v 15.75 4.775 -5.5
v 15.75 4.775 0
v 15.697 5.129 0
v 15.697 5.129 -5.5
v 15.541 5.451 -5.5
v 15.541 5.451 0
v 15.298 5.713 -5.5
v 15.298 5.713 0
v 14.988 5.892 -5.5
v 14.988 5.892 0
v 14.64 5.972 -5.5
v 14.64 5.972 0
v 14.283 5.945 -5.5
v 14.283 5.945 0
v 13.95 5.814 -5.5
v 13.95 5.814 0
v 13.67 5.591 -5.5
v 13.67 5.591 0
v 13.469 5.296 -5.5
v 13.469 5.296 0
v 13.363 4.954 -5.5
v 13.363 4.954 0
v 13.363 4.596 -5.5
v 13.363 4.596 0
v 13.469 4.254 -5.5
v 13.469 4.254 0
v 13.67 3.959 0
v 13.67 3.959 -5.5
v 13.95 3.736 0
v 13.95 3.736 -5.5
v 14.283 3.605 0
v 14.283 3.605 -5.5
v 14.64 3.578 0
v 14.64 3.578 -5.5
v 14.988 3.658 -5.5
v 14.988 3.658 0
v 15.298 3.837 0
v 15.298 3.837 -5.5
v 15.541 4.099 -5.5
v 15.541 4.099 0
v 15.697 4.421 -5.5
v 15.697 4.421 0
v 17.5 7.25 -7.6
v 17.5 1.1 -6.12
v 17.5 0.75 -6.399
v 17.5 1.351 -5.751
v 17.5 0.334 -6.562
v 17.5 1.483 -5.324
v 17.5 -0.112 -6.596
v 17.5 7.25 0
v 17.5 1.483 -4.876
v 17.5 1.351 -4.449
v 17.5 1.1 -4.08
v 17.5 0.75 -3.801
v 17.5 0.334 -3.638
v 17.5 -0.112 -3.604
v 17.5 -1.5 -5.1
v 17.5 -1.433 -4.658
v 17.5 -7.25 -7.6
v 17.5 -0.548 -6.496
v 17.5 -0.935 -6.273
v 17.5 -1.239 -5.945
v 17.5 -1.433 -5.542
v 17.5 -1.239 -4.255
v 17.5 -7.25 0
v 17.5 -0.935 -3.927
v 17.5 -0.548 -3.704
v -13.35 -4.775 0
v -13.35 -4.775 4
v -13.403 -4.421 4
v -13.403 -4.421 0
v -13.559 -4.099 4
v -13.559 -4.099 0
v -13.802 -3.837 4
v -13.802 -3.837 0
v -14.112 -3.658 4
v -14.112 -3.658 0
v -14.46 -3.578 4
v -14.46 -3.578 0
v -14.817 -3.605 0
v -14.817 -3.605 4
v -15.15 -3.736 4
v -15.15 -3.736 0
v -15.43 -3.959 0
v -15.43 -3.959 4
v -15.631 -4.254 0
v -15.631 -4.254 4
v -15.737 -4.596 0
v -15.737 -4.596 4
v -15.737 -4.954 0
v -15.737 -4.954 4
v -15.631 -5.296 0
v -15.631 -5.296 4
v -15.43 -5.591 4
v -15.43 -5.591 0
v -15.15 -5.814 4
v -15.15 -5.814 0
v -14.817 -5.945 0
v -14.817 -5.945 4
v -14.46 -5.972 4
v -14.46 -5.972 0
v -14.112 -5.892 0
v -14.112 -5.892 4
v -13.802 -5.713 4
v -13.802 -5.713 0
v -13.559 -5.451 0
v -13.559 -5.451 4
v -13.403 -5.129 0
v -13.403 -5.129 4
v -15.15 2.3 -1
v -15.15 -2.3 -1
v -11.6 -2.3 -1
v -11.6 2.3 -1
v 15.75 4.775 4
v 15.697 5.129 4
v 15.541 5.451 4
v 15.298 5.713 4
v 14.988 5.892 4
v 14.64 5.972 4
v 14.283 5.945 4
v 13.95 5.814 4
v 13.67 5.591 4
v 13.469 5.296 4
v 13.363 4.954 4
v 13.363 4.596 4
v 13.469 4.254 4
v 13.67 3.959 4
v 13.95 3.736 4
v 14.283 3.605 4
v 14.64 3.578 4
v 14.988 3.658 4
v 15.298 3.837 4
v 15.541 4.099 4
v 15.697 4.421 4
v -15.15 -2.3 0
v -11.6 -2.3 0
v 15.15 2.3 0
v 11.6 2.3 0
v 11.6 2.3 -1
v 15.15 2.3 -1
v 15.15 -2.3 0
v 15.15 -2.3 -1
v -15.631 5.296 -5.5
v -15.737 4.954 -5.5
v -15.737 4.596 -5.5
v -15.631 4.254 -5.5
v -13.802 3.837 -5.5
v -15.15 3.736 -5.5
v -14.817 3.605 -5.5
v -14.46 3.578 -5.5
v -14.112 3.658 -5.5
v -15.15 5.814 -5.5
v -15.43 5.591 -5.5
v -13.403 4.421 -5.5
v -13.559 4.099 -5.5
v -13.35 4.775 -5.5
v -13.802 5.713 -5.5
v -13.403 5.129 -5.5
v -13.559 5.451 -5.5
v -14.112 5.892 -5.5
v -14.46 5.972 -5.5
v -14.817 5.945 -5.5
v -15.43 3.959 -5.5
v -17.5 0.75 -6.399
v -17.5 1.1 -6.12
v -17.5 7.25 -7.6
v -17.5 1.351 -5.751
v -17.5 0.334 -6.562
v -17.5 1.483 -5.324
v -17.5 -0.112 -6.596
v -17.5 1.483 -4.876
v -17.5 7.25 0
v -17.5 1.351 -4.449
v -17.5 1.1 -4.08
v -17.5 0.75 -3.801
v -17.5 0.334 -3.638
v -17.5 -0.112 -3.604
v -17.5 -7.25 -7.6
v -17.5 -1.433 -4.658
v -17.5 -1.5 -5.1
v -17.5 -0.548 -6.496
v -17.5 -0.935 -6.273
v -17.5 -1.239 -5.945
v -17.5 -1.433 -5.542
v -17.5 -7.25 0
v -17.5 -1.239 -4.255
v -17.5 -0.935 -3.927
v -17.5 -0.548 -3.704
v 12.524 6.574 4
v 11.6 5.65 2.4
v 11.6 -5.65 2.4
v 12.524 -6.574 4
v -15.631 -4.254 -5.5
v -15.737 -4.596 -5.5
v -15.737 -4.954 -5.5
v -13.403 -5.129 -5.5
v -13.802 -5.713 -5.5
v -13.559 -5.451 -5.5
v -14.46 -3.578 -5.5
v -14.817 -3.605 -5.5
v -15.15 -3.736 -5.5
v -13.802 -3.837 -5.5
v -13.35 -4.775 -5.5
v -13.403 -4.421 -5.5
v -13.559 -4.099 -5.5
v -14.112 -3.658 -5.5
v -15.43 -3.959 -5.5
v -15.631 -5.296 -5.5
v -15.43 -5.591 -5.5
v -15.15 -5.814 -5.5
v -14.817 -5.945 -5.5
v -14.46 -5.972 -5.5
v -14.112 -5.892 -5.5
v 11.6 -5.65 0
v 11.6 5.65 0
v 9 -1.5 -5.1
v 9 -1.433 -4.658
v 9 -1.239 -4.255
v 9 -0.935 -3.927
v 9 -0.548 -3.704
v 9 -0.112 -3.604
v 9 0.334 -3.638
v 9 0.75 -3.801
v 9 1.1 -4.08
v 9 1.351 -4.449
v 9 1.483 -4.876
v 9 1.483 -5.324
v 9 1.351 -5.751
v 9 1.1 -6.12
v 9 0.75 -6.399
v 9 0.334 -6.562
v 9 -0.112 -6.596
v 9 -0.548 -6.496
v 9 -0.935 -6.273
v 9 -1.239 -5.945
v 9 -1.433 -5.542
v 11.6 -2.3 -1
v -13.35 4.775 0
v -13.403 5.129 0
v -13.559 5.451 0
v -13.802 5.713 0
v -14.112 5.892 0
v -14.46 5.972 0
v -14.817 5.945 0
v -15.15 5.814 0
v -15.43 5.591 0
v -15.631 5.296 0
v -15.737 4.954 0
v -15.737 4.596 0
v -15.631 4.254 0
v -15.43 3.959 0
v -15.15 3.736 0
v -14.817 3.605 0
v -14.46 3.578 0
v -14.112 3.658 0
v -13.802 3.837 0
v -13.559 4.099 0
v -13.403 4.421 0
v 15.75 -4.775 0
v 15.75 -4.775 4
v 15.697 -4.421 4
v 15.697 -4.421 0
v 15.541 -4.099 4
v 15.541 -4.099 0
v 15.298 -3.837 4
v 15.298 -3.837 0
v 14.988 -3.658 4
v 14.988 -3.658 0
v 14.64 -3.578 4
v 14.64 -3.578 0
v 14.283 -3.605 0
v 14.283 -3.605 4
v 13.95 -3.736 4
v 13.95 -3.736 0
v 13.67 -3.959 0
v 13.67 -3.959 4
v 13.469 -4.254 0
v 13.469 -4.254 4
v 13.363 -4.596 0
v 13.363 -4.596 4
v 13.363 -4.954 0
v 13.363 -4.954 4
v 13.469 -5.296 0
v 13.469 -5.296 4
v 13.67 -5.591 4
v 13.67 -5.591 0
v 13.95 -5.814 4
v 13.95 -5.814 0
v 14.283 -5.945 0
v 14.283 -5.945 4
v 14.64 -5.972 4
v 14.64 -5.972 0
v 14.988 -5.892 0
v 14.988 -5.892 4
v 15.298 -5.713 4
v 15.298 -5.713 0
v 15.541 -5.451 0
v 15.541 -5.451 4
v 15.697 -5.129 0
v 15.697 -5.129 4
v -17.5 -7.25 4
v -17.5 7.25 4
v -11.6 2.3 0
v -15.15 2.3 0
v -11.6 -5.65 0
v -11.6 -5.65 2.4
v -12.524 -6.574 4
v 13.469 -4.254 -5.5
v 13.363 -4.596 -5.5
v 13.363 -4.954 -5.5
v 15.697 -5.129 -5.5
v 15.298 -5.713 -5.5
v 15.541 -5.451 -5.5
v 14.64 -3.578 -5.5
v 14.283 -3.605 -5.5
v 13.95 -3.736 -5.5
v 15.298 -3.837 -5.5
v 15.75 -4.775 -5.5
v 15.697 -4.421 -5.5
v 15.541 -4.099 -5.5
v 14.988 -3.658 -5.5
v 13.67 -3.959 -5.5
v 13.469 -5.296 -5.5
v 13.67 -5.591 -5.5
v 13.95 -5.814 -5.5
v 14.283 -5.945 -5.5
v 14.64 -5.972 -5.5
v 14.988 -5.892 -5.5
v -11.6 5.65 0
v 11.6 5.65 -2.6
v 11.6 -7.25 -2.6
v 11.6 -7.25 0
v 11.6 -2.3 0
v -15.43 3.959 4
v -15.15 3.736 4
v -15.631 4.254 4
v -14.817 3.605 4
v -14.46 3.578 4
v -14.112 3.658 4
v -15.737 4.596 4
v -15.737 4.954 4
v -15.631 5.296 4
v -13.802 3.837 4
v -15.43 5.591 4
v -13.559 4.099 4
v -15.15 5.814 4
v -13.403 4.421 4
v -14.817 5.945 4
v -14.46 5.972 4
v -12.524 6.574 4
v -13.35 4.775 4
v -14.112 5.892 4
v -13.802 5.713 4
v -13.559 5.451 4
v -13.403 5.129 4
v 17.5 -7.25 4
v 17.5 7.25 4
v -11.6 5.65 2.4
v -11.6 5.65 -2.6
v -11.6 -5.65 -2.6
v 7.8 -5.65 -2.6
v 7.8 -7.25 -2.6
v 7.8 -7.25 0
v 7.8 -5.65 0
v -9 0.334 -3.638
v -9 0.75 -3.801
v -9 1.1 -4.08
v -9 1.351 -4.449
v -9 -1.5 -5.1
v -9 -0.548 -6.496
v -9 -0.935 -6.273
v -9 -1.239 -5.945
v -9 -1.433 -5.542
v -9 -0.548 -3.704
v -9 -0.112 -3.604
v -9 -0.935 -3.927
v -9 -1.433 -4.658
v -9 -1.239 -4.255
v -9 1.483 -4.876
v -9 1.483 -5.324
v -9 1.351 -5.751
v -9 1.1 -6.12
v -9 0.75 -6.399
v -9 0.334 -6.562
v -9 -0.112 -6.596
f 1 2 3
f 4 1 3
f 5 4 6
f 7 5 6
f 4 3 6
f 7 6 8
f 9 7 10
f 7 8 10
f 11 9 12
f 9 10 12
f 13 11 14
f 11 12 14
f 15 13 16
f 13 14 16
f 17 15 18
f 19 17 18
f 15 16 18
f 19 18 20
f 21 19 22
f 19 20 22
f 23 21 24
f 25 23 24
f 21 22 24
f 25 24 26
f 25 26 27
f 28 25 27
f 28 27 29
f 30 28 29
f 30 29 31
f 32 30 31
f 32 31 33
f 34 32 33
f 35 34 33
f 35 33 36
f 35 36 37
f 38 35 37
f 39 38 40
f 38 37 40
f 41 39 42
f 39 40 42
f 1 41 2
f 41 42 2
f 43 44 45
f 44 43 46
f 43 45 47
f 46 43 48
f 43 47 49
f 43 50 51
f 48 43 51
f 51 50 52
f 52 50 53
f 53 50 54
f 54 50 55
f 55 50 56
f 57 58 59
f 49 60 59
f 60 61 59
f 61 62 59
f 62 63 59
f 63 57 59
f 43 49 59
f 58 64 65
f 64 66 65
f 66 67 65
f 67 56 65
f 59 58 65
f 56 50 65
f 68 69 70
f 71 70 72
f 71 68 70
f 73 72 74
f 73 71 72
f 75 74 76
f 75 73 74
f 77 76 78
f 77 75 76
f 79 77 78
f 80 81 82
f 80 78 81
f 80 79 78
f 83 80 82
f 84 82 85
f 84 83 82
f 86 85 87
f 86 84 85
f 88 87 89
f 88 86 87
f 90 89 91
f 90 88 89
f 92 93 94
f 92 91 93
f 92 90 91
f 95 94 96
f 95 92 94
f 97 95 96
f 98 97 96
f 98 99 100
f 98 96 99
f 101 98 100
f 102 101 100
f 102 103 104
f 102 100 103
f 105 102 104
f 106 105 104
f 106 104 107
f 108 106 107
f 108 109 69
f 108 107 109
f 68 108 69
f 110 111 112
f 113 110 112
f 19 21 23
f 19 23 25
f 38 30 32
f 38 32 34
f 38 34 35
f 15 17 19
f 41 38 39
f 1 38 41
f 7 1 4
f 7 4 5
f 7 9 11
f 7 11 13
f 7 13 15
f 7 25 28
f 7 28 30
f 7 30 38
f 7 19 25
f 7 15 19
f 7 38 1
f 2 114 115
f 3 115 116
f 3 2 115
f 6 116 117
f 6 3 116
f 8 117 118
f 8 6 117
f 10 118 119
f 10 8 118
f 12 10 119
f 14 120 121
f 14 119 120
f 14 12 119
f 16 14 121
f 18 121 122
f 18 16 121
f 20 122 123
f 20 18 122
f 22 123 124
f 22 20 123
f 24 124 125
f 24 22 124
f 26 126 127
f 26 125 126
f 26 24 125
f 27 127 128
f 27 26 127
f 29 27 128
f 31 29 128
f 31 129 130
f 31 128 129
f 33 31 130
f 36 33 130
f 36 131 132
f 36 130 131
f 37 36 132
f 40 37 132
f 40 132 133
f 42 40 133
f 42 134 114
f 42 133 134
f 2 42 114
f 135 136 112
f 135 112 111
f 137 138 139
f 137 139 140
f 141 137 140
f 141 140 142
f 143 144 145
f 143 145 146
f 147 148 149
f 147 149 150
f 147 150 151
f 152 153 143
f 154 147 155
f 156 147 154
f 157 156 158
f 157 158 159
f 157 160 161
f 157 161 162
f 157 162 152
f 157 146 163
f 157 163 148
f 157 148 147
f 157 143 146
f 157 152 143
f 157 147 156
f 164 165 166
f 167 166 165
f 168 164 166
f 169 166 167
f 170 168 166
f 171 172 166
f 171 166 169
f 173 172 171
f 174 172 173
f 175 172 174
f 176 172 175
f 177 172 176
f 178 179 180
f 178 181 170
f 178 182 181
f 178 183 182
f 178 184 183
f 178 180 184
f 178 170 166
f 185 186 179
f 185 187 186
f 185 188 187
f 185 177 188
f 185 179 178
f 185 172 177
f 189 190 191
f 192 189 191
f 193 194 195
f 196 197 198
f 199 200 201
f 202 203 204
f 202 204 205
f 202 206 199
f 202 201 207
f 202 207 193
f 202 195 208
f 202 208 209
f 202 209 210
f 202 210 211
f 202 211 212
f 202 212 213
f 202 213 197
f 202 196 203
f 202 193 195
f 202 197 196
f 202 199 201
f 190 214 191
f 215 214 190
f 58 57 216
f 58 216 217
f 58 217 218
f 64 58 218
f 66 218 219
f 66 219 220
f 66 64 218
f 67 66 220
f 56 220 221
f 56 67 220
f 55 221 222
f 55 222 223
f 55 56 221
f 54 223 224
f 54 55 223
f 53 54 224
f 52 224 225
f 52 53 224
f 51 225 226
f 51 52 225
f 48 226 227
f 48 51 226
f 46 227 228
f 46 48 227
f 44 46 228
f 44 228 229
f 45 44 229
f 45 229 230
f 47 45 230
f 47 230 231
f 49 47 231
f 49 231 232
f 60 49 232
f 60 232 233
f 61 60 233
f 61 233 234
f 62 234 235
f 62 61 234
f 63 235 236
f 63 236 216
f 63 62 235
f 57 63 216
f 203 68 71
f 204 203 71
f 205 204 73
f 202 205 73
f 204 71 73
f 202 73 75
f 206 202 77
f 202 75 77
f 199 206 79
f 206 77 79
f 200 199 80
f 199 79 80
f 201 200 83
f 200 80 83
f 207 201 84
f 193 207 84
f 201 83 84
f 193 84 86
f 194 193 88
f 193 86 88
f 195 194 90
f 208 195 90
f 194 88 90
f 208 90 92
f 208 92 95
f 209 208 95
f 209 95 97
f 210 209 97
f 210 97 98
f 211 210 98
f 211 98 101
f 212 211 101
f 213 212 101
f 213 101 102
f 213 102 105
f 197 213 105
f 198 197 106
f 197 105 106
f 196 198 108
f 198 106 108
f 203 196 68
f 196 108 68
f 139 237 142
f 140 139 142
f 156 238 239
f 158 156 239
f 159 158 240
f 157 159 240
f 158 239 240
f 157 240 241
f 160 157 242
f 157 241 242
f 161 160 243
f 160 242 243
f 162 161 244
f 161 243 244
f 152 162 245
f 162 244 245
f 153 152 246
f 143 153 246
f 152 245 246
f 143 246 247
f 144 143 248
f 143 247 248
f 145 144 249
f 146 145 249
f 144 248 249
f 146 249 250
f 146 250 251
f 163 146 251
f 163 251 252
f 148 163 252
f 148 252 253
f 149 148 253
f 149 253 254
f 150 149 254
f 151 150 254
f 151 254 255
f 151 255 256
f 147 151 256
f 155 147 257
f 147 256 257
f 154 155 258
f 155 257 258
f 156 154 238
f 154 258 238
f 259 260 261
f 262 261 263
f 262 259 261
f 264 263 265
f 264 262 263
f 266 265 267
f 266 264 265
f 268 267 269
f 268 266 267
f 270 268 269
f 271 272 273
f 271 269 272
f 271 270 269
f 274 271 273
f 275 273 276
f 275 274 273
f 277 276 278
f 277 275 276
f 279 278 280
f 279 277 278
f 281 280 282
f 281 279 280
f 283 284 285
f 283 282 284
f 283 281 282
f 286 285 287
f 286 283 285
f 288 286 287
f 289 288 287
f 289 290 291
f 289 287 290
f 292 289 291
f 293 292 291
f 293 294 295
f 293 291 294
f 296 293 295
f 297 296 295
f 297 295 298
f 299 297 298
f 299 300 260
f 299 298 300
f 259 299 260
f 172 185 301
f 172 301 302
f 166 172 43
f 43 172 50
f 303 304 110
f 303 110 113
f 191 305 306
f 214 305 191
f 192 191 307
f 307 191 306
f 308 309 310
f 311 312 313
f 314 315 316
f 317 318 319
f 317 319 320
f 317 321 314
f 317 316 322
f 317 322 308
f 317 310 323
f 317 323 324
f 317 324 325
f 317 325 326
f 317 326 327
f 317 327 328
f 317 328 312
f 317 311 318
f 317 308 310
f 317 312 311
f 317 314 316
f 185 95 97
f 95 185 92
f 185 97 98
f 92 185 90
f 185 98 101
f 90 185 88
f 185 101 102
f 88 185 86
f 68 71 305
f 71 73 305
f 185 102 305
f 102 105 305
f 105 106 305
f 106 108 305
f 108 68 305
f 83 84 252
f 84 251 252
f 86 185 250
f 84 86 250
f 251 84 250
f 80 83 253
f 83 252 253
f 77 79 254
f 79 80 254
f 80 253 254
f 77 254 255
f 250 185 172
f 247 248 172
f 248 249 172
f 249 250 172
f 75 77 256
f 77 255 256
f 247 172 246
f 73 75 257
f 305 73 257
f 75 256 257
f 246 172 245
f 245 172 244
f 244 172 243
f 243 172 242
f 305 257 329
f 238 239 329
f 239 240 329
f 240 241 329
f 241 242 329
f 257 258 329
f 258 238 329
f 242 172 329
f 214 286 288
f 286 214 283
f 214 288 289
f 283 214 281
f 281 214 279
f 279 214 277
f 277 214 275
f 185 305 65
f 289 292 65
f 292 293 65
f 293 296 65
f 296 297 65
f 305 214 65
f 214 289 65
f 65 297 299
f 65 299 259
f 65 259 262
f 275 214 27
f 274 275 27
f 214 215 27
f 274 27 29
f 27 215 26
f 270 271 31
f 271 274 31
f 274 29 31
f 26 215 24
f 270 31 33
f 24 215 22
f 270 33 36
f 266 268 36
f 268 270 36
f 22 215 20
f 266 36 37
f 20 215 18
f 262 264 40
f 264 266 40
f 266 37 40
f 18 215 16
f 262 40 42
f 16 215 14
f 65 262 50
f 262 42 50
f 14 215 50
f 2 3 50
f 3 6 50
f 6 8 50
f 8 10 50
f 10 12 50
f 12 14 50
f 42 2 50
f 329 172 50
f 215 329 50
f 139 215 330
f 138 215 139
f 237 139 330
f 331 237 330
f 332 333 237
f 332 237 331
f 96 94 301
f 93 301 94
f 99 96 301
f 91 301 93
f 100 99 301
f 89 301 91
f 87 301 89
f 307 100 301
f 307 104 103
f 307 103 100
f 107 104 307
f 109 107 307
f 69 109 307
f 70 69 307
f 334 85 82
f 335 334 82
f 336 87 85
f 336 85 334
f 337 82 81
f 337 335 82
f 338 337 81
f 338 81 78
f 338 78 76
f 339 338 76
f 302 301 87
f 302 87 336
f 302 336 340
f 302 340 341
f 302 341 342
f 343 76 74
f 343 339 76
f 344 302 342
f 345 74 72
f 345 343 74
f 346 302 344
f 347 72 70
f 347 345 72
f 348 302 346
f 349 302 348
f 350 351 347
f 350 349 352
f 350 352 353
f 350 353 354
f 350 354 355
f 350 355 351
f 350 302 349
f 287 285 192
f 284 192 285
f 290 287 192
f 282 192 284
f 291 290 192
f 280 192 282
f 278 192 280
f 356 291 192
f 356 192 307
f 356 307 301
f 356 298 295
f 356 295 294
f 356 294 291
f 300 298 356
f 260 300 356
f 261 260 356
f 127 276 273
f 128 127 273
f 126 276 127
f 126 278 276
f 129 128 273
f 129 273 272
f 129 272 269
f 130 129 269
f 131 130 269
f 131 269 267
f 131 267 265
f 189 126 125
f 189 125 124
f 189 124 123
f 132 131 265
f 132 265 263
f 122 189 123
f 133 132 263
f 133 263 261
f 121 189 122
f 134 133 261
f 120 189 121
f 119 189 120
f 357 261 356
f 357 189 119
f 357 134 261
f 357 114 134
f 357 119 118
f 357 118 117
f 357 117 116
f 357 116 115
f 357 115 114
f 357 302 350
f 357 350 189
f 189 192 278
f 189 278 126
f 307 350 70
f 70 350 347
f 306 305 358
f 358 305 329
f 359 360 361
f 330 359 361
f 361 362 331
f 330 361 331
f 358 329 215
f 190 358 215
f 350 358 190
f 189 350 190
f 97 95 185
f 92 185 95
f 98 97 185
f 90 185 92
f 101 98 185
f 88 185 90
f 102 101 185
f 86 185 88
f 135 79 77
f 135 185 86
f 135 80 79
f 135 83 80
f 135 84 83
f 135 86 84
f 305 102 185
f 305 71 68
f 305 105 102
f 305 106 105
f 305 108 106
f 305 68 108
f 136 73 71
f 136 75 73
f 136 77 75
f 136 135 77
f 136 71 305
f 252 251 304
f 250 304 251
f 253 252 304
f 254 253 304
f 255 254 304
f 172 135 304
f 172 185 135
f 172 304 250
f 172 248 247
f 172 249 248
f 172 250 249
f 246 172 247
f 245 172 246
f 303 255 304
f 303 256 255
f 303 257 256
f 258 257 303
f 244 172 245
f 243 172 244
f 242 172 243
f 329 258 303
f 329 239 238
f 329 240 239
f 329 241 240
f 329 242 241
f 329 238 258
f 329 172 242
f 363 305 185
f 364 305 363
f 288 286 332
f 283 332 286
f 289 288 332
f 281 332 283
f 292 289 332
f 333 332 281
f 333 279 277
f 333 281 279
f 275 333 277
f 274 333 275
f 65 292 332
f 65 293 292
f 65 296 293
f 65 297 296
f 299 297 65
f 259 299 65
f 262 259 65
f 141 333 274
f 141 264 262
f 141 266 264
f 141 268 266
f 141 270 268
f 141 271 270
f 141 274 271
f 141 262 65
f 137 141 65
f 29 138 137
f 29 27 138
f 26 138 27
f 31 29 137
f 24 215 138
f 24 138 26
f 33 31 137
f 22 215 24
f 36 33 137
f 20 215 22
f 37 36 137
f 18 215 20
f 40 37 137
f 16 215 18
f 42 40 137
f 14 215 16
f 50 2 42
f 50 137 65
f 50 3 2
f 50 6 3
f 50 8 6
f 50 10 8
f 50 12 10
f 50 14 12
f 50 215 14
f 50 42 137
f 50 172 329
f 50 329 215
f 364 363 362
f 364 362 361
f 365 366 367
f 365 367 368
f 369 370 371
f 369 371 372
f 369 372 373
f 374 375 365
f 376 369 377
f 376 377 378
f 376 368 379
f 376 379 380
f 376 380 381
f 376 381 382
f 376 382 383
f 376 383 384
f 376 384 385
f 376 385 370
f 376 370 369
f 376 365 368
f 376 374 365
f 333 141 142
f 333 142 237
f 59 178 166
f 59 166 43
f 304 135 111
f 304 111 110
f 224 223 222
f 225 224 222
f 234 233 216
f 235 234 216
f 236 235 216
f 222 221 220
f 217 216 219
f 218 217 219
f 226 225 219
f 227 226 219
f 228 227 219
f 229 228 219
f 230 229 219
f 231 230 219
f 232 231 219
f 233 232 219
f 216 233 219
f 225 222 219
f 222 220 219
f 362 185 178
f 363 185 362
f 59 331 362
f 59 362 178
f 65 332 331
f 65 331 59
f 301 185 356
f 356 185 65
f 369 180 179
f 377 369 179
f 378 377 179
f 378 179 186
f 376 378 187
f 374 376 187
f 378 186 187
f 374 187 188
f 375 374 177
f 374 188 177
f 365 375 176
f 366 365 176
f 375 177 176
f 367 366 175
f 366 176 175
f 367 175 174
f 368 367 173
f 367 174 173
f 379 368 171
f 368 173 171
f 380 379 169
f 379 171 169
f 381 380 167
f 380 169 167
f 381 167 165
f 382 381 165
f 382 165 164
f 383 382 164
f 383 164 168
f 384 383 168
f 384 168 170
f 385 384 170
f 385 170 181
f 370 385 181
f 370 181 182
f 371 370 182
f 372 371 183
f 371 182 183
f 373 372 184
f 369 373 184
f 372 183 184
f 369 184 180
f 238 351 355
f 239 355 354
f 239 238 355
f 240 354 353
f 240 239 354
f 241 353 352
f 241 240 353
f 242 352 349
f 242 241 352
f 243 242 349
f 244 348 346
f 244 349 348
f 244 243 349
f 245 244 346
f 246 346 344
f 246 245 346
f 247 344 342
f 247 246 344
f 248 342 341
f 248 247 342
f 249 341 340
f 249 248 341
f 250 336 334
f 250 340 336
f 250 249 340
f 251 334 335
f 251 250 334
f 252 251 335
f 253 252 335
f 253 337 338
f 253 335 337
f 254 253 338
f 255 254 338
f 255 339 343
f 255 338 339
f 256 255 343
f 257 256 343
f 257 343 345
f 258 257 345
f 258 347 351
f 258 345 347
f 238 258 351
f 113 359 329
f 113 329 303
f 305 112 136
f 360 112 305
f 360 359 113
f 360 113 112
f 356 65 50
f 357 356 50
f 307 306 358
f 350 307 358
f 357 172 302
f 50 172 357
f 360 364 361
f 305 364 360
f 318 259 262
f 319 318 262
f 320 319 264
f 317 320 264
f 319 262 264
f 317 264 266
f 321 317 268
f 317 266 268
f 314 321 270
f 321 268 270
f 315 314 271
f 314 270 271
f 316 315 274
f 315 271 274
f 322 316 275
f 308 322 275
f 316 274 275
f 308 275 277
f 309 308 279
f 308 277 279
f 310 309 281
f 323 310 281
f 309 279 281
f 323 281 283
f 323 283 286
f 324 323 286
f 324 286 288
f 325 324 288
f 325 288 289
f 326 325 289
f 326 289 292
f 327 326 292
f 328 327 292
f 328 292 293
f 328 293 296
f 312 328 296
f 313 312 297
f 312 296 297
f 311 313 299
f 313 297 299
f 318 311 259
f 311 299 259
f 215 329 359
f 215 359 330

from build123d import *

# Parameters (mm, degrees)
F1_DEPTH       = 2.6
F2_W           = 3.55
F2_H           = 4.6
F3_DEPTH       = 1.6
F4_W           = 35
F4_H           = 14.5
F5_DEPTH       = 5
F6_R           = 1.5
F7_DEPTH       = 8.5
F8_W           = 35
F8_H           = 14.5
F8_W_2         = 23.2
F8_H_2         = 11.3
F9_DEPTH       = 4
F10_R          = 1.2
F11_DEPTH      = 5.5
F11_DEPTH_BACK = 4.001
F12_C1_SIZE2   = 1.6
F12_C1_SIZE    = 0.9237604307
F12_C2_SIZE2   = 1.6
F12_C2_SIZE    = 0.9237604307
F12_C3_SIZE2   = 1.6
F12_C3_SIZE    = 0.9237604307
F12_C4_SIZE2   = 1.6
F12_C4_SIZE    = 0.9237604307


# Not quite as in the source:
# - a pattern or mirror of a feature is missing from the dataset's text; its kind, count and spacing are read off the source's solid


with BuildPart() as f1:
    # F0 (on Top) → F1 (new body)
    with BuildSketch(Plane.XY):
        Polygon((17.5, -7.25), (17.5, 7.25), (-17.5, 7.25), (-17.5, -7.25), (7.8, -7.25), (7.8, -5.65), (-11.6, -5.65), (-11.6, -2.3), (-15.15, -2.3), (-15.15, 2.3), (-11.6, 2.3), (-11.6, 5.65), (11.6, 5.65), (11.6, 2.3), (15.15, 2.3), (15.15, -2.3), (11.6, -2.3), (11.6, -7.25), align=None)
    extrude(amount=-F1_DEPTH)

    # F2 (on face) → F3 (join, through all)
    with BuildSketch(Plane(origin=(0, 0, -2.6), x_dir=(1, 0, 0), z_dir=(0, 0, -1))):
        with Locations((-13.375, 0)):
            Rectangle(F2_W, F2_H)
        with Locations((13.375, 0)):
            Rectangle(F2_W, F2_H)
    extrude(amount=-F3_DEPTH)

    # F4 (on face) → F5 (join)
    with BuildSketch(Plane(origin=(0, 0, -2.6), x_dir=(1, 0, 0), z_dir=(0, 0, -1))):
        Rectangle(F4_W, F4_H)
    extrude(amount=F5_DEPTH)

    # F6 (on face) → F7 (cut)
    with BuildSketch(Plane(origin=(-17.5, 0, 0), x_dir=(0, -1, 0), z_dir=(-1, 0, 0))):
        with Locations((0, -5.1)):
            Circle(F6_R)
    f7 = extrude(amount=-F7_DEPTH, mode=Mode.SUBTRACT)

    # F7_copies: F7 across plane
    add(f7.mirror(Plane(origin=(0, 0, 0), x_dir=(0, 0, 1), z_dir=(1, 0, 0))), mode=Mode.SUBTRACT)


with BuildPart() as f9:
    # F8 (on face) → F9 (new body)
    with BuildSketch(Plane.XY):
        Rectangle(F8_W, F8_H)
        Rectangle(F8_W_2, F8_H_2, mode=Mode.SUBTRACT)
    extrude(amount=F9_DEPTH)


with BuildPart() as f11_tool:
    # F10 (on face) → F11 (new body, two sides)
    with BuildSketch(Plane.XY) as f11_sk:
        with Locations((-14.55, 4.775)):
            Circle(F10_R)
        with Locations((14.55, 4.775)):
            Circle(F10_R)
        with Locations((-14.55, -4.775)):
            Circle(F10_R)
        with Locations((14.55, -4.775)):
            Circle(F10_R)
    extrude(amount=-F11_DEPTH)
    extrude(f11_sk.sketch, amount=F11_DEPTH_BACK)


with BuildPart() as f1_1:
    add(f1.part)

    # F11: cut by f11_tool
    add(f11_tool.part, mode=Mode.SUBTRACT)


with BuildPart() as f9_1:
    add(f9.part)

    # F11: cut by f11_tool
    add(f11_tool.part, mode=Mode.SUBTRACT)

    # F12: chamfer of 1.6 x 0.9237604307 on 4 edges, made by hand

    # F12_c1
    f12_c1_edges = [f9_1.edges().sort_by_distance(p)[0] for p in [
        (-11.6, 0, 4),
    ]]
    f12_c1_side = f9_1.faces().sort_by_distance((-11.6184752086, 0, 4))[0]
    chamfer(f12_c1_edges, length=F12_C1_SIZE, length2=F12_C1_SIZE2, reference=f12_c1_side)

    # F12_c2
    f12_c2_edges = [f9_1.edges().sort_by_distance(p)[0] for p in [
        (0, -5.65, 4),
    ]]
    f12_c2_side = f9_1.faces().sort_by_distance((0, -5.6684752086, 4))[0]
    chamfer(f12_c2_edges, length=F12_C2_SIZE, length2=F12_C2_SIZE2, reference=f12_c2_side)

    # F12_c3
    f12_c3_edges = [f9_1.edges().sort_by_distance(p)[0] for p in [
        (0, 5.65, 4),
    ]]
    f12_c3_side = f9_1.faces().sort_by_distance((0, 5.6684752086, 4))[0]
    chamfer(f12_c3_edges, length=F12_C3_SIZE, length2=F12_C3_SIZE2, reference=f12_c3_side)

    # F12_c4
    f12_c4_edges = [f9_1.edges().sort_by_distance(p)[0] for p in [
        (11.6, 0, 4),
    ]]
    f12_c4_side = f9_1.faces().sort_by_distance((11.6184752086, 0, 4))[0]
    chamfer(f12_c4_edges, length=F12_C4_SIZE, length2=F12_C4_SIZE2, reference=f12_c4_side)


solid = Compound([f1_1.part, f9_1.part])
